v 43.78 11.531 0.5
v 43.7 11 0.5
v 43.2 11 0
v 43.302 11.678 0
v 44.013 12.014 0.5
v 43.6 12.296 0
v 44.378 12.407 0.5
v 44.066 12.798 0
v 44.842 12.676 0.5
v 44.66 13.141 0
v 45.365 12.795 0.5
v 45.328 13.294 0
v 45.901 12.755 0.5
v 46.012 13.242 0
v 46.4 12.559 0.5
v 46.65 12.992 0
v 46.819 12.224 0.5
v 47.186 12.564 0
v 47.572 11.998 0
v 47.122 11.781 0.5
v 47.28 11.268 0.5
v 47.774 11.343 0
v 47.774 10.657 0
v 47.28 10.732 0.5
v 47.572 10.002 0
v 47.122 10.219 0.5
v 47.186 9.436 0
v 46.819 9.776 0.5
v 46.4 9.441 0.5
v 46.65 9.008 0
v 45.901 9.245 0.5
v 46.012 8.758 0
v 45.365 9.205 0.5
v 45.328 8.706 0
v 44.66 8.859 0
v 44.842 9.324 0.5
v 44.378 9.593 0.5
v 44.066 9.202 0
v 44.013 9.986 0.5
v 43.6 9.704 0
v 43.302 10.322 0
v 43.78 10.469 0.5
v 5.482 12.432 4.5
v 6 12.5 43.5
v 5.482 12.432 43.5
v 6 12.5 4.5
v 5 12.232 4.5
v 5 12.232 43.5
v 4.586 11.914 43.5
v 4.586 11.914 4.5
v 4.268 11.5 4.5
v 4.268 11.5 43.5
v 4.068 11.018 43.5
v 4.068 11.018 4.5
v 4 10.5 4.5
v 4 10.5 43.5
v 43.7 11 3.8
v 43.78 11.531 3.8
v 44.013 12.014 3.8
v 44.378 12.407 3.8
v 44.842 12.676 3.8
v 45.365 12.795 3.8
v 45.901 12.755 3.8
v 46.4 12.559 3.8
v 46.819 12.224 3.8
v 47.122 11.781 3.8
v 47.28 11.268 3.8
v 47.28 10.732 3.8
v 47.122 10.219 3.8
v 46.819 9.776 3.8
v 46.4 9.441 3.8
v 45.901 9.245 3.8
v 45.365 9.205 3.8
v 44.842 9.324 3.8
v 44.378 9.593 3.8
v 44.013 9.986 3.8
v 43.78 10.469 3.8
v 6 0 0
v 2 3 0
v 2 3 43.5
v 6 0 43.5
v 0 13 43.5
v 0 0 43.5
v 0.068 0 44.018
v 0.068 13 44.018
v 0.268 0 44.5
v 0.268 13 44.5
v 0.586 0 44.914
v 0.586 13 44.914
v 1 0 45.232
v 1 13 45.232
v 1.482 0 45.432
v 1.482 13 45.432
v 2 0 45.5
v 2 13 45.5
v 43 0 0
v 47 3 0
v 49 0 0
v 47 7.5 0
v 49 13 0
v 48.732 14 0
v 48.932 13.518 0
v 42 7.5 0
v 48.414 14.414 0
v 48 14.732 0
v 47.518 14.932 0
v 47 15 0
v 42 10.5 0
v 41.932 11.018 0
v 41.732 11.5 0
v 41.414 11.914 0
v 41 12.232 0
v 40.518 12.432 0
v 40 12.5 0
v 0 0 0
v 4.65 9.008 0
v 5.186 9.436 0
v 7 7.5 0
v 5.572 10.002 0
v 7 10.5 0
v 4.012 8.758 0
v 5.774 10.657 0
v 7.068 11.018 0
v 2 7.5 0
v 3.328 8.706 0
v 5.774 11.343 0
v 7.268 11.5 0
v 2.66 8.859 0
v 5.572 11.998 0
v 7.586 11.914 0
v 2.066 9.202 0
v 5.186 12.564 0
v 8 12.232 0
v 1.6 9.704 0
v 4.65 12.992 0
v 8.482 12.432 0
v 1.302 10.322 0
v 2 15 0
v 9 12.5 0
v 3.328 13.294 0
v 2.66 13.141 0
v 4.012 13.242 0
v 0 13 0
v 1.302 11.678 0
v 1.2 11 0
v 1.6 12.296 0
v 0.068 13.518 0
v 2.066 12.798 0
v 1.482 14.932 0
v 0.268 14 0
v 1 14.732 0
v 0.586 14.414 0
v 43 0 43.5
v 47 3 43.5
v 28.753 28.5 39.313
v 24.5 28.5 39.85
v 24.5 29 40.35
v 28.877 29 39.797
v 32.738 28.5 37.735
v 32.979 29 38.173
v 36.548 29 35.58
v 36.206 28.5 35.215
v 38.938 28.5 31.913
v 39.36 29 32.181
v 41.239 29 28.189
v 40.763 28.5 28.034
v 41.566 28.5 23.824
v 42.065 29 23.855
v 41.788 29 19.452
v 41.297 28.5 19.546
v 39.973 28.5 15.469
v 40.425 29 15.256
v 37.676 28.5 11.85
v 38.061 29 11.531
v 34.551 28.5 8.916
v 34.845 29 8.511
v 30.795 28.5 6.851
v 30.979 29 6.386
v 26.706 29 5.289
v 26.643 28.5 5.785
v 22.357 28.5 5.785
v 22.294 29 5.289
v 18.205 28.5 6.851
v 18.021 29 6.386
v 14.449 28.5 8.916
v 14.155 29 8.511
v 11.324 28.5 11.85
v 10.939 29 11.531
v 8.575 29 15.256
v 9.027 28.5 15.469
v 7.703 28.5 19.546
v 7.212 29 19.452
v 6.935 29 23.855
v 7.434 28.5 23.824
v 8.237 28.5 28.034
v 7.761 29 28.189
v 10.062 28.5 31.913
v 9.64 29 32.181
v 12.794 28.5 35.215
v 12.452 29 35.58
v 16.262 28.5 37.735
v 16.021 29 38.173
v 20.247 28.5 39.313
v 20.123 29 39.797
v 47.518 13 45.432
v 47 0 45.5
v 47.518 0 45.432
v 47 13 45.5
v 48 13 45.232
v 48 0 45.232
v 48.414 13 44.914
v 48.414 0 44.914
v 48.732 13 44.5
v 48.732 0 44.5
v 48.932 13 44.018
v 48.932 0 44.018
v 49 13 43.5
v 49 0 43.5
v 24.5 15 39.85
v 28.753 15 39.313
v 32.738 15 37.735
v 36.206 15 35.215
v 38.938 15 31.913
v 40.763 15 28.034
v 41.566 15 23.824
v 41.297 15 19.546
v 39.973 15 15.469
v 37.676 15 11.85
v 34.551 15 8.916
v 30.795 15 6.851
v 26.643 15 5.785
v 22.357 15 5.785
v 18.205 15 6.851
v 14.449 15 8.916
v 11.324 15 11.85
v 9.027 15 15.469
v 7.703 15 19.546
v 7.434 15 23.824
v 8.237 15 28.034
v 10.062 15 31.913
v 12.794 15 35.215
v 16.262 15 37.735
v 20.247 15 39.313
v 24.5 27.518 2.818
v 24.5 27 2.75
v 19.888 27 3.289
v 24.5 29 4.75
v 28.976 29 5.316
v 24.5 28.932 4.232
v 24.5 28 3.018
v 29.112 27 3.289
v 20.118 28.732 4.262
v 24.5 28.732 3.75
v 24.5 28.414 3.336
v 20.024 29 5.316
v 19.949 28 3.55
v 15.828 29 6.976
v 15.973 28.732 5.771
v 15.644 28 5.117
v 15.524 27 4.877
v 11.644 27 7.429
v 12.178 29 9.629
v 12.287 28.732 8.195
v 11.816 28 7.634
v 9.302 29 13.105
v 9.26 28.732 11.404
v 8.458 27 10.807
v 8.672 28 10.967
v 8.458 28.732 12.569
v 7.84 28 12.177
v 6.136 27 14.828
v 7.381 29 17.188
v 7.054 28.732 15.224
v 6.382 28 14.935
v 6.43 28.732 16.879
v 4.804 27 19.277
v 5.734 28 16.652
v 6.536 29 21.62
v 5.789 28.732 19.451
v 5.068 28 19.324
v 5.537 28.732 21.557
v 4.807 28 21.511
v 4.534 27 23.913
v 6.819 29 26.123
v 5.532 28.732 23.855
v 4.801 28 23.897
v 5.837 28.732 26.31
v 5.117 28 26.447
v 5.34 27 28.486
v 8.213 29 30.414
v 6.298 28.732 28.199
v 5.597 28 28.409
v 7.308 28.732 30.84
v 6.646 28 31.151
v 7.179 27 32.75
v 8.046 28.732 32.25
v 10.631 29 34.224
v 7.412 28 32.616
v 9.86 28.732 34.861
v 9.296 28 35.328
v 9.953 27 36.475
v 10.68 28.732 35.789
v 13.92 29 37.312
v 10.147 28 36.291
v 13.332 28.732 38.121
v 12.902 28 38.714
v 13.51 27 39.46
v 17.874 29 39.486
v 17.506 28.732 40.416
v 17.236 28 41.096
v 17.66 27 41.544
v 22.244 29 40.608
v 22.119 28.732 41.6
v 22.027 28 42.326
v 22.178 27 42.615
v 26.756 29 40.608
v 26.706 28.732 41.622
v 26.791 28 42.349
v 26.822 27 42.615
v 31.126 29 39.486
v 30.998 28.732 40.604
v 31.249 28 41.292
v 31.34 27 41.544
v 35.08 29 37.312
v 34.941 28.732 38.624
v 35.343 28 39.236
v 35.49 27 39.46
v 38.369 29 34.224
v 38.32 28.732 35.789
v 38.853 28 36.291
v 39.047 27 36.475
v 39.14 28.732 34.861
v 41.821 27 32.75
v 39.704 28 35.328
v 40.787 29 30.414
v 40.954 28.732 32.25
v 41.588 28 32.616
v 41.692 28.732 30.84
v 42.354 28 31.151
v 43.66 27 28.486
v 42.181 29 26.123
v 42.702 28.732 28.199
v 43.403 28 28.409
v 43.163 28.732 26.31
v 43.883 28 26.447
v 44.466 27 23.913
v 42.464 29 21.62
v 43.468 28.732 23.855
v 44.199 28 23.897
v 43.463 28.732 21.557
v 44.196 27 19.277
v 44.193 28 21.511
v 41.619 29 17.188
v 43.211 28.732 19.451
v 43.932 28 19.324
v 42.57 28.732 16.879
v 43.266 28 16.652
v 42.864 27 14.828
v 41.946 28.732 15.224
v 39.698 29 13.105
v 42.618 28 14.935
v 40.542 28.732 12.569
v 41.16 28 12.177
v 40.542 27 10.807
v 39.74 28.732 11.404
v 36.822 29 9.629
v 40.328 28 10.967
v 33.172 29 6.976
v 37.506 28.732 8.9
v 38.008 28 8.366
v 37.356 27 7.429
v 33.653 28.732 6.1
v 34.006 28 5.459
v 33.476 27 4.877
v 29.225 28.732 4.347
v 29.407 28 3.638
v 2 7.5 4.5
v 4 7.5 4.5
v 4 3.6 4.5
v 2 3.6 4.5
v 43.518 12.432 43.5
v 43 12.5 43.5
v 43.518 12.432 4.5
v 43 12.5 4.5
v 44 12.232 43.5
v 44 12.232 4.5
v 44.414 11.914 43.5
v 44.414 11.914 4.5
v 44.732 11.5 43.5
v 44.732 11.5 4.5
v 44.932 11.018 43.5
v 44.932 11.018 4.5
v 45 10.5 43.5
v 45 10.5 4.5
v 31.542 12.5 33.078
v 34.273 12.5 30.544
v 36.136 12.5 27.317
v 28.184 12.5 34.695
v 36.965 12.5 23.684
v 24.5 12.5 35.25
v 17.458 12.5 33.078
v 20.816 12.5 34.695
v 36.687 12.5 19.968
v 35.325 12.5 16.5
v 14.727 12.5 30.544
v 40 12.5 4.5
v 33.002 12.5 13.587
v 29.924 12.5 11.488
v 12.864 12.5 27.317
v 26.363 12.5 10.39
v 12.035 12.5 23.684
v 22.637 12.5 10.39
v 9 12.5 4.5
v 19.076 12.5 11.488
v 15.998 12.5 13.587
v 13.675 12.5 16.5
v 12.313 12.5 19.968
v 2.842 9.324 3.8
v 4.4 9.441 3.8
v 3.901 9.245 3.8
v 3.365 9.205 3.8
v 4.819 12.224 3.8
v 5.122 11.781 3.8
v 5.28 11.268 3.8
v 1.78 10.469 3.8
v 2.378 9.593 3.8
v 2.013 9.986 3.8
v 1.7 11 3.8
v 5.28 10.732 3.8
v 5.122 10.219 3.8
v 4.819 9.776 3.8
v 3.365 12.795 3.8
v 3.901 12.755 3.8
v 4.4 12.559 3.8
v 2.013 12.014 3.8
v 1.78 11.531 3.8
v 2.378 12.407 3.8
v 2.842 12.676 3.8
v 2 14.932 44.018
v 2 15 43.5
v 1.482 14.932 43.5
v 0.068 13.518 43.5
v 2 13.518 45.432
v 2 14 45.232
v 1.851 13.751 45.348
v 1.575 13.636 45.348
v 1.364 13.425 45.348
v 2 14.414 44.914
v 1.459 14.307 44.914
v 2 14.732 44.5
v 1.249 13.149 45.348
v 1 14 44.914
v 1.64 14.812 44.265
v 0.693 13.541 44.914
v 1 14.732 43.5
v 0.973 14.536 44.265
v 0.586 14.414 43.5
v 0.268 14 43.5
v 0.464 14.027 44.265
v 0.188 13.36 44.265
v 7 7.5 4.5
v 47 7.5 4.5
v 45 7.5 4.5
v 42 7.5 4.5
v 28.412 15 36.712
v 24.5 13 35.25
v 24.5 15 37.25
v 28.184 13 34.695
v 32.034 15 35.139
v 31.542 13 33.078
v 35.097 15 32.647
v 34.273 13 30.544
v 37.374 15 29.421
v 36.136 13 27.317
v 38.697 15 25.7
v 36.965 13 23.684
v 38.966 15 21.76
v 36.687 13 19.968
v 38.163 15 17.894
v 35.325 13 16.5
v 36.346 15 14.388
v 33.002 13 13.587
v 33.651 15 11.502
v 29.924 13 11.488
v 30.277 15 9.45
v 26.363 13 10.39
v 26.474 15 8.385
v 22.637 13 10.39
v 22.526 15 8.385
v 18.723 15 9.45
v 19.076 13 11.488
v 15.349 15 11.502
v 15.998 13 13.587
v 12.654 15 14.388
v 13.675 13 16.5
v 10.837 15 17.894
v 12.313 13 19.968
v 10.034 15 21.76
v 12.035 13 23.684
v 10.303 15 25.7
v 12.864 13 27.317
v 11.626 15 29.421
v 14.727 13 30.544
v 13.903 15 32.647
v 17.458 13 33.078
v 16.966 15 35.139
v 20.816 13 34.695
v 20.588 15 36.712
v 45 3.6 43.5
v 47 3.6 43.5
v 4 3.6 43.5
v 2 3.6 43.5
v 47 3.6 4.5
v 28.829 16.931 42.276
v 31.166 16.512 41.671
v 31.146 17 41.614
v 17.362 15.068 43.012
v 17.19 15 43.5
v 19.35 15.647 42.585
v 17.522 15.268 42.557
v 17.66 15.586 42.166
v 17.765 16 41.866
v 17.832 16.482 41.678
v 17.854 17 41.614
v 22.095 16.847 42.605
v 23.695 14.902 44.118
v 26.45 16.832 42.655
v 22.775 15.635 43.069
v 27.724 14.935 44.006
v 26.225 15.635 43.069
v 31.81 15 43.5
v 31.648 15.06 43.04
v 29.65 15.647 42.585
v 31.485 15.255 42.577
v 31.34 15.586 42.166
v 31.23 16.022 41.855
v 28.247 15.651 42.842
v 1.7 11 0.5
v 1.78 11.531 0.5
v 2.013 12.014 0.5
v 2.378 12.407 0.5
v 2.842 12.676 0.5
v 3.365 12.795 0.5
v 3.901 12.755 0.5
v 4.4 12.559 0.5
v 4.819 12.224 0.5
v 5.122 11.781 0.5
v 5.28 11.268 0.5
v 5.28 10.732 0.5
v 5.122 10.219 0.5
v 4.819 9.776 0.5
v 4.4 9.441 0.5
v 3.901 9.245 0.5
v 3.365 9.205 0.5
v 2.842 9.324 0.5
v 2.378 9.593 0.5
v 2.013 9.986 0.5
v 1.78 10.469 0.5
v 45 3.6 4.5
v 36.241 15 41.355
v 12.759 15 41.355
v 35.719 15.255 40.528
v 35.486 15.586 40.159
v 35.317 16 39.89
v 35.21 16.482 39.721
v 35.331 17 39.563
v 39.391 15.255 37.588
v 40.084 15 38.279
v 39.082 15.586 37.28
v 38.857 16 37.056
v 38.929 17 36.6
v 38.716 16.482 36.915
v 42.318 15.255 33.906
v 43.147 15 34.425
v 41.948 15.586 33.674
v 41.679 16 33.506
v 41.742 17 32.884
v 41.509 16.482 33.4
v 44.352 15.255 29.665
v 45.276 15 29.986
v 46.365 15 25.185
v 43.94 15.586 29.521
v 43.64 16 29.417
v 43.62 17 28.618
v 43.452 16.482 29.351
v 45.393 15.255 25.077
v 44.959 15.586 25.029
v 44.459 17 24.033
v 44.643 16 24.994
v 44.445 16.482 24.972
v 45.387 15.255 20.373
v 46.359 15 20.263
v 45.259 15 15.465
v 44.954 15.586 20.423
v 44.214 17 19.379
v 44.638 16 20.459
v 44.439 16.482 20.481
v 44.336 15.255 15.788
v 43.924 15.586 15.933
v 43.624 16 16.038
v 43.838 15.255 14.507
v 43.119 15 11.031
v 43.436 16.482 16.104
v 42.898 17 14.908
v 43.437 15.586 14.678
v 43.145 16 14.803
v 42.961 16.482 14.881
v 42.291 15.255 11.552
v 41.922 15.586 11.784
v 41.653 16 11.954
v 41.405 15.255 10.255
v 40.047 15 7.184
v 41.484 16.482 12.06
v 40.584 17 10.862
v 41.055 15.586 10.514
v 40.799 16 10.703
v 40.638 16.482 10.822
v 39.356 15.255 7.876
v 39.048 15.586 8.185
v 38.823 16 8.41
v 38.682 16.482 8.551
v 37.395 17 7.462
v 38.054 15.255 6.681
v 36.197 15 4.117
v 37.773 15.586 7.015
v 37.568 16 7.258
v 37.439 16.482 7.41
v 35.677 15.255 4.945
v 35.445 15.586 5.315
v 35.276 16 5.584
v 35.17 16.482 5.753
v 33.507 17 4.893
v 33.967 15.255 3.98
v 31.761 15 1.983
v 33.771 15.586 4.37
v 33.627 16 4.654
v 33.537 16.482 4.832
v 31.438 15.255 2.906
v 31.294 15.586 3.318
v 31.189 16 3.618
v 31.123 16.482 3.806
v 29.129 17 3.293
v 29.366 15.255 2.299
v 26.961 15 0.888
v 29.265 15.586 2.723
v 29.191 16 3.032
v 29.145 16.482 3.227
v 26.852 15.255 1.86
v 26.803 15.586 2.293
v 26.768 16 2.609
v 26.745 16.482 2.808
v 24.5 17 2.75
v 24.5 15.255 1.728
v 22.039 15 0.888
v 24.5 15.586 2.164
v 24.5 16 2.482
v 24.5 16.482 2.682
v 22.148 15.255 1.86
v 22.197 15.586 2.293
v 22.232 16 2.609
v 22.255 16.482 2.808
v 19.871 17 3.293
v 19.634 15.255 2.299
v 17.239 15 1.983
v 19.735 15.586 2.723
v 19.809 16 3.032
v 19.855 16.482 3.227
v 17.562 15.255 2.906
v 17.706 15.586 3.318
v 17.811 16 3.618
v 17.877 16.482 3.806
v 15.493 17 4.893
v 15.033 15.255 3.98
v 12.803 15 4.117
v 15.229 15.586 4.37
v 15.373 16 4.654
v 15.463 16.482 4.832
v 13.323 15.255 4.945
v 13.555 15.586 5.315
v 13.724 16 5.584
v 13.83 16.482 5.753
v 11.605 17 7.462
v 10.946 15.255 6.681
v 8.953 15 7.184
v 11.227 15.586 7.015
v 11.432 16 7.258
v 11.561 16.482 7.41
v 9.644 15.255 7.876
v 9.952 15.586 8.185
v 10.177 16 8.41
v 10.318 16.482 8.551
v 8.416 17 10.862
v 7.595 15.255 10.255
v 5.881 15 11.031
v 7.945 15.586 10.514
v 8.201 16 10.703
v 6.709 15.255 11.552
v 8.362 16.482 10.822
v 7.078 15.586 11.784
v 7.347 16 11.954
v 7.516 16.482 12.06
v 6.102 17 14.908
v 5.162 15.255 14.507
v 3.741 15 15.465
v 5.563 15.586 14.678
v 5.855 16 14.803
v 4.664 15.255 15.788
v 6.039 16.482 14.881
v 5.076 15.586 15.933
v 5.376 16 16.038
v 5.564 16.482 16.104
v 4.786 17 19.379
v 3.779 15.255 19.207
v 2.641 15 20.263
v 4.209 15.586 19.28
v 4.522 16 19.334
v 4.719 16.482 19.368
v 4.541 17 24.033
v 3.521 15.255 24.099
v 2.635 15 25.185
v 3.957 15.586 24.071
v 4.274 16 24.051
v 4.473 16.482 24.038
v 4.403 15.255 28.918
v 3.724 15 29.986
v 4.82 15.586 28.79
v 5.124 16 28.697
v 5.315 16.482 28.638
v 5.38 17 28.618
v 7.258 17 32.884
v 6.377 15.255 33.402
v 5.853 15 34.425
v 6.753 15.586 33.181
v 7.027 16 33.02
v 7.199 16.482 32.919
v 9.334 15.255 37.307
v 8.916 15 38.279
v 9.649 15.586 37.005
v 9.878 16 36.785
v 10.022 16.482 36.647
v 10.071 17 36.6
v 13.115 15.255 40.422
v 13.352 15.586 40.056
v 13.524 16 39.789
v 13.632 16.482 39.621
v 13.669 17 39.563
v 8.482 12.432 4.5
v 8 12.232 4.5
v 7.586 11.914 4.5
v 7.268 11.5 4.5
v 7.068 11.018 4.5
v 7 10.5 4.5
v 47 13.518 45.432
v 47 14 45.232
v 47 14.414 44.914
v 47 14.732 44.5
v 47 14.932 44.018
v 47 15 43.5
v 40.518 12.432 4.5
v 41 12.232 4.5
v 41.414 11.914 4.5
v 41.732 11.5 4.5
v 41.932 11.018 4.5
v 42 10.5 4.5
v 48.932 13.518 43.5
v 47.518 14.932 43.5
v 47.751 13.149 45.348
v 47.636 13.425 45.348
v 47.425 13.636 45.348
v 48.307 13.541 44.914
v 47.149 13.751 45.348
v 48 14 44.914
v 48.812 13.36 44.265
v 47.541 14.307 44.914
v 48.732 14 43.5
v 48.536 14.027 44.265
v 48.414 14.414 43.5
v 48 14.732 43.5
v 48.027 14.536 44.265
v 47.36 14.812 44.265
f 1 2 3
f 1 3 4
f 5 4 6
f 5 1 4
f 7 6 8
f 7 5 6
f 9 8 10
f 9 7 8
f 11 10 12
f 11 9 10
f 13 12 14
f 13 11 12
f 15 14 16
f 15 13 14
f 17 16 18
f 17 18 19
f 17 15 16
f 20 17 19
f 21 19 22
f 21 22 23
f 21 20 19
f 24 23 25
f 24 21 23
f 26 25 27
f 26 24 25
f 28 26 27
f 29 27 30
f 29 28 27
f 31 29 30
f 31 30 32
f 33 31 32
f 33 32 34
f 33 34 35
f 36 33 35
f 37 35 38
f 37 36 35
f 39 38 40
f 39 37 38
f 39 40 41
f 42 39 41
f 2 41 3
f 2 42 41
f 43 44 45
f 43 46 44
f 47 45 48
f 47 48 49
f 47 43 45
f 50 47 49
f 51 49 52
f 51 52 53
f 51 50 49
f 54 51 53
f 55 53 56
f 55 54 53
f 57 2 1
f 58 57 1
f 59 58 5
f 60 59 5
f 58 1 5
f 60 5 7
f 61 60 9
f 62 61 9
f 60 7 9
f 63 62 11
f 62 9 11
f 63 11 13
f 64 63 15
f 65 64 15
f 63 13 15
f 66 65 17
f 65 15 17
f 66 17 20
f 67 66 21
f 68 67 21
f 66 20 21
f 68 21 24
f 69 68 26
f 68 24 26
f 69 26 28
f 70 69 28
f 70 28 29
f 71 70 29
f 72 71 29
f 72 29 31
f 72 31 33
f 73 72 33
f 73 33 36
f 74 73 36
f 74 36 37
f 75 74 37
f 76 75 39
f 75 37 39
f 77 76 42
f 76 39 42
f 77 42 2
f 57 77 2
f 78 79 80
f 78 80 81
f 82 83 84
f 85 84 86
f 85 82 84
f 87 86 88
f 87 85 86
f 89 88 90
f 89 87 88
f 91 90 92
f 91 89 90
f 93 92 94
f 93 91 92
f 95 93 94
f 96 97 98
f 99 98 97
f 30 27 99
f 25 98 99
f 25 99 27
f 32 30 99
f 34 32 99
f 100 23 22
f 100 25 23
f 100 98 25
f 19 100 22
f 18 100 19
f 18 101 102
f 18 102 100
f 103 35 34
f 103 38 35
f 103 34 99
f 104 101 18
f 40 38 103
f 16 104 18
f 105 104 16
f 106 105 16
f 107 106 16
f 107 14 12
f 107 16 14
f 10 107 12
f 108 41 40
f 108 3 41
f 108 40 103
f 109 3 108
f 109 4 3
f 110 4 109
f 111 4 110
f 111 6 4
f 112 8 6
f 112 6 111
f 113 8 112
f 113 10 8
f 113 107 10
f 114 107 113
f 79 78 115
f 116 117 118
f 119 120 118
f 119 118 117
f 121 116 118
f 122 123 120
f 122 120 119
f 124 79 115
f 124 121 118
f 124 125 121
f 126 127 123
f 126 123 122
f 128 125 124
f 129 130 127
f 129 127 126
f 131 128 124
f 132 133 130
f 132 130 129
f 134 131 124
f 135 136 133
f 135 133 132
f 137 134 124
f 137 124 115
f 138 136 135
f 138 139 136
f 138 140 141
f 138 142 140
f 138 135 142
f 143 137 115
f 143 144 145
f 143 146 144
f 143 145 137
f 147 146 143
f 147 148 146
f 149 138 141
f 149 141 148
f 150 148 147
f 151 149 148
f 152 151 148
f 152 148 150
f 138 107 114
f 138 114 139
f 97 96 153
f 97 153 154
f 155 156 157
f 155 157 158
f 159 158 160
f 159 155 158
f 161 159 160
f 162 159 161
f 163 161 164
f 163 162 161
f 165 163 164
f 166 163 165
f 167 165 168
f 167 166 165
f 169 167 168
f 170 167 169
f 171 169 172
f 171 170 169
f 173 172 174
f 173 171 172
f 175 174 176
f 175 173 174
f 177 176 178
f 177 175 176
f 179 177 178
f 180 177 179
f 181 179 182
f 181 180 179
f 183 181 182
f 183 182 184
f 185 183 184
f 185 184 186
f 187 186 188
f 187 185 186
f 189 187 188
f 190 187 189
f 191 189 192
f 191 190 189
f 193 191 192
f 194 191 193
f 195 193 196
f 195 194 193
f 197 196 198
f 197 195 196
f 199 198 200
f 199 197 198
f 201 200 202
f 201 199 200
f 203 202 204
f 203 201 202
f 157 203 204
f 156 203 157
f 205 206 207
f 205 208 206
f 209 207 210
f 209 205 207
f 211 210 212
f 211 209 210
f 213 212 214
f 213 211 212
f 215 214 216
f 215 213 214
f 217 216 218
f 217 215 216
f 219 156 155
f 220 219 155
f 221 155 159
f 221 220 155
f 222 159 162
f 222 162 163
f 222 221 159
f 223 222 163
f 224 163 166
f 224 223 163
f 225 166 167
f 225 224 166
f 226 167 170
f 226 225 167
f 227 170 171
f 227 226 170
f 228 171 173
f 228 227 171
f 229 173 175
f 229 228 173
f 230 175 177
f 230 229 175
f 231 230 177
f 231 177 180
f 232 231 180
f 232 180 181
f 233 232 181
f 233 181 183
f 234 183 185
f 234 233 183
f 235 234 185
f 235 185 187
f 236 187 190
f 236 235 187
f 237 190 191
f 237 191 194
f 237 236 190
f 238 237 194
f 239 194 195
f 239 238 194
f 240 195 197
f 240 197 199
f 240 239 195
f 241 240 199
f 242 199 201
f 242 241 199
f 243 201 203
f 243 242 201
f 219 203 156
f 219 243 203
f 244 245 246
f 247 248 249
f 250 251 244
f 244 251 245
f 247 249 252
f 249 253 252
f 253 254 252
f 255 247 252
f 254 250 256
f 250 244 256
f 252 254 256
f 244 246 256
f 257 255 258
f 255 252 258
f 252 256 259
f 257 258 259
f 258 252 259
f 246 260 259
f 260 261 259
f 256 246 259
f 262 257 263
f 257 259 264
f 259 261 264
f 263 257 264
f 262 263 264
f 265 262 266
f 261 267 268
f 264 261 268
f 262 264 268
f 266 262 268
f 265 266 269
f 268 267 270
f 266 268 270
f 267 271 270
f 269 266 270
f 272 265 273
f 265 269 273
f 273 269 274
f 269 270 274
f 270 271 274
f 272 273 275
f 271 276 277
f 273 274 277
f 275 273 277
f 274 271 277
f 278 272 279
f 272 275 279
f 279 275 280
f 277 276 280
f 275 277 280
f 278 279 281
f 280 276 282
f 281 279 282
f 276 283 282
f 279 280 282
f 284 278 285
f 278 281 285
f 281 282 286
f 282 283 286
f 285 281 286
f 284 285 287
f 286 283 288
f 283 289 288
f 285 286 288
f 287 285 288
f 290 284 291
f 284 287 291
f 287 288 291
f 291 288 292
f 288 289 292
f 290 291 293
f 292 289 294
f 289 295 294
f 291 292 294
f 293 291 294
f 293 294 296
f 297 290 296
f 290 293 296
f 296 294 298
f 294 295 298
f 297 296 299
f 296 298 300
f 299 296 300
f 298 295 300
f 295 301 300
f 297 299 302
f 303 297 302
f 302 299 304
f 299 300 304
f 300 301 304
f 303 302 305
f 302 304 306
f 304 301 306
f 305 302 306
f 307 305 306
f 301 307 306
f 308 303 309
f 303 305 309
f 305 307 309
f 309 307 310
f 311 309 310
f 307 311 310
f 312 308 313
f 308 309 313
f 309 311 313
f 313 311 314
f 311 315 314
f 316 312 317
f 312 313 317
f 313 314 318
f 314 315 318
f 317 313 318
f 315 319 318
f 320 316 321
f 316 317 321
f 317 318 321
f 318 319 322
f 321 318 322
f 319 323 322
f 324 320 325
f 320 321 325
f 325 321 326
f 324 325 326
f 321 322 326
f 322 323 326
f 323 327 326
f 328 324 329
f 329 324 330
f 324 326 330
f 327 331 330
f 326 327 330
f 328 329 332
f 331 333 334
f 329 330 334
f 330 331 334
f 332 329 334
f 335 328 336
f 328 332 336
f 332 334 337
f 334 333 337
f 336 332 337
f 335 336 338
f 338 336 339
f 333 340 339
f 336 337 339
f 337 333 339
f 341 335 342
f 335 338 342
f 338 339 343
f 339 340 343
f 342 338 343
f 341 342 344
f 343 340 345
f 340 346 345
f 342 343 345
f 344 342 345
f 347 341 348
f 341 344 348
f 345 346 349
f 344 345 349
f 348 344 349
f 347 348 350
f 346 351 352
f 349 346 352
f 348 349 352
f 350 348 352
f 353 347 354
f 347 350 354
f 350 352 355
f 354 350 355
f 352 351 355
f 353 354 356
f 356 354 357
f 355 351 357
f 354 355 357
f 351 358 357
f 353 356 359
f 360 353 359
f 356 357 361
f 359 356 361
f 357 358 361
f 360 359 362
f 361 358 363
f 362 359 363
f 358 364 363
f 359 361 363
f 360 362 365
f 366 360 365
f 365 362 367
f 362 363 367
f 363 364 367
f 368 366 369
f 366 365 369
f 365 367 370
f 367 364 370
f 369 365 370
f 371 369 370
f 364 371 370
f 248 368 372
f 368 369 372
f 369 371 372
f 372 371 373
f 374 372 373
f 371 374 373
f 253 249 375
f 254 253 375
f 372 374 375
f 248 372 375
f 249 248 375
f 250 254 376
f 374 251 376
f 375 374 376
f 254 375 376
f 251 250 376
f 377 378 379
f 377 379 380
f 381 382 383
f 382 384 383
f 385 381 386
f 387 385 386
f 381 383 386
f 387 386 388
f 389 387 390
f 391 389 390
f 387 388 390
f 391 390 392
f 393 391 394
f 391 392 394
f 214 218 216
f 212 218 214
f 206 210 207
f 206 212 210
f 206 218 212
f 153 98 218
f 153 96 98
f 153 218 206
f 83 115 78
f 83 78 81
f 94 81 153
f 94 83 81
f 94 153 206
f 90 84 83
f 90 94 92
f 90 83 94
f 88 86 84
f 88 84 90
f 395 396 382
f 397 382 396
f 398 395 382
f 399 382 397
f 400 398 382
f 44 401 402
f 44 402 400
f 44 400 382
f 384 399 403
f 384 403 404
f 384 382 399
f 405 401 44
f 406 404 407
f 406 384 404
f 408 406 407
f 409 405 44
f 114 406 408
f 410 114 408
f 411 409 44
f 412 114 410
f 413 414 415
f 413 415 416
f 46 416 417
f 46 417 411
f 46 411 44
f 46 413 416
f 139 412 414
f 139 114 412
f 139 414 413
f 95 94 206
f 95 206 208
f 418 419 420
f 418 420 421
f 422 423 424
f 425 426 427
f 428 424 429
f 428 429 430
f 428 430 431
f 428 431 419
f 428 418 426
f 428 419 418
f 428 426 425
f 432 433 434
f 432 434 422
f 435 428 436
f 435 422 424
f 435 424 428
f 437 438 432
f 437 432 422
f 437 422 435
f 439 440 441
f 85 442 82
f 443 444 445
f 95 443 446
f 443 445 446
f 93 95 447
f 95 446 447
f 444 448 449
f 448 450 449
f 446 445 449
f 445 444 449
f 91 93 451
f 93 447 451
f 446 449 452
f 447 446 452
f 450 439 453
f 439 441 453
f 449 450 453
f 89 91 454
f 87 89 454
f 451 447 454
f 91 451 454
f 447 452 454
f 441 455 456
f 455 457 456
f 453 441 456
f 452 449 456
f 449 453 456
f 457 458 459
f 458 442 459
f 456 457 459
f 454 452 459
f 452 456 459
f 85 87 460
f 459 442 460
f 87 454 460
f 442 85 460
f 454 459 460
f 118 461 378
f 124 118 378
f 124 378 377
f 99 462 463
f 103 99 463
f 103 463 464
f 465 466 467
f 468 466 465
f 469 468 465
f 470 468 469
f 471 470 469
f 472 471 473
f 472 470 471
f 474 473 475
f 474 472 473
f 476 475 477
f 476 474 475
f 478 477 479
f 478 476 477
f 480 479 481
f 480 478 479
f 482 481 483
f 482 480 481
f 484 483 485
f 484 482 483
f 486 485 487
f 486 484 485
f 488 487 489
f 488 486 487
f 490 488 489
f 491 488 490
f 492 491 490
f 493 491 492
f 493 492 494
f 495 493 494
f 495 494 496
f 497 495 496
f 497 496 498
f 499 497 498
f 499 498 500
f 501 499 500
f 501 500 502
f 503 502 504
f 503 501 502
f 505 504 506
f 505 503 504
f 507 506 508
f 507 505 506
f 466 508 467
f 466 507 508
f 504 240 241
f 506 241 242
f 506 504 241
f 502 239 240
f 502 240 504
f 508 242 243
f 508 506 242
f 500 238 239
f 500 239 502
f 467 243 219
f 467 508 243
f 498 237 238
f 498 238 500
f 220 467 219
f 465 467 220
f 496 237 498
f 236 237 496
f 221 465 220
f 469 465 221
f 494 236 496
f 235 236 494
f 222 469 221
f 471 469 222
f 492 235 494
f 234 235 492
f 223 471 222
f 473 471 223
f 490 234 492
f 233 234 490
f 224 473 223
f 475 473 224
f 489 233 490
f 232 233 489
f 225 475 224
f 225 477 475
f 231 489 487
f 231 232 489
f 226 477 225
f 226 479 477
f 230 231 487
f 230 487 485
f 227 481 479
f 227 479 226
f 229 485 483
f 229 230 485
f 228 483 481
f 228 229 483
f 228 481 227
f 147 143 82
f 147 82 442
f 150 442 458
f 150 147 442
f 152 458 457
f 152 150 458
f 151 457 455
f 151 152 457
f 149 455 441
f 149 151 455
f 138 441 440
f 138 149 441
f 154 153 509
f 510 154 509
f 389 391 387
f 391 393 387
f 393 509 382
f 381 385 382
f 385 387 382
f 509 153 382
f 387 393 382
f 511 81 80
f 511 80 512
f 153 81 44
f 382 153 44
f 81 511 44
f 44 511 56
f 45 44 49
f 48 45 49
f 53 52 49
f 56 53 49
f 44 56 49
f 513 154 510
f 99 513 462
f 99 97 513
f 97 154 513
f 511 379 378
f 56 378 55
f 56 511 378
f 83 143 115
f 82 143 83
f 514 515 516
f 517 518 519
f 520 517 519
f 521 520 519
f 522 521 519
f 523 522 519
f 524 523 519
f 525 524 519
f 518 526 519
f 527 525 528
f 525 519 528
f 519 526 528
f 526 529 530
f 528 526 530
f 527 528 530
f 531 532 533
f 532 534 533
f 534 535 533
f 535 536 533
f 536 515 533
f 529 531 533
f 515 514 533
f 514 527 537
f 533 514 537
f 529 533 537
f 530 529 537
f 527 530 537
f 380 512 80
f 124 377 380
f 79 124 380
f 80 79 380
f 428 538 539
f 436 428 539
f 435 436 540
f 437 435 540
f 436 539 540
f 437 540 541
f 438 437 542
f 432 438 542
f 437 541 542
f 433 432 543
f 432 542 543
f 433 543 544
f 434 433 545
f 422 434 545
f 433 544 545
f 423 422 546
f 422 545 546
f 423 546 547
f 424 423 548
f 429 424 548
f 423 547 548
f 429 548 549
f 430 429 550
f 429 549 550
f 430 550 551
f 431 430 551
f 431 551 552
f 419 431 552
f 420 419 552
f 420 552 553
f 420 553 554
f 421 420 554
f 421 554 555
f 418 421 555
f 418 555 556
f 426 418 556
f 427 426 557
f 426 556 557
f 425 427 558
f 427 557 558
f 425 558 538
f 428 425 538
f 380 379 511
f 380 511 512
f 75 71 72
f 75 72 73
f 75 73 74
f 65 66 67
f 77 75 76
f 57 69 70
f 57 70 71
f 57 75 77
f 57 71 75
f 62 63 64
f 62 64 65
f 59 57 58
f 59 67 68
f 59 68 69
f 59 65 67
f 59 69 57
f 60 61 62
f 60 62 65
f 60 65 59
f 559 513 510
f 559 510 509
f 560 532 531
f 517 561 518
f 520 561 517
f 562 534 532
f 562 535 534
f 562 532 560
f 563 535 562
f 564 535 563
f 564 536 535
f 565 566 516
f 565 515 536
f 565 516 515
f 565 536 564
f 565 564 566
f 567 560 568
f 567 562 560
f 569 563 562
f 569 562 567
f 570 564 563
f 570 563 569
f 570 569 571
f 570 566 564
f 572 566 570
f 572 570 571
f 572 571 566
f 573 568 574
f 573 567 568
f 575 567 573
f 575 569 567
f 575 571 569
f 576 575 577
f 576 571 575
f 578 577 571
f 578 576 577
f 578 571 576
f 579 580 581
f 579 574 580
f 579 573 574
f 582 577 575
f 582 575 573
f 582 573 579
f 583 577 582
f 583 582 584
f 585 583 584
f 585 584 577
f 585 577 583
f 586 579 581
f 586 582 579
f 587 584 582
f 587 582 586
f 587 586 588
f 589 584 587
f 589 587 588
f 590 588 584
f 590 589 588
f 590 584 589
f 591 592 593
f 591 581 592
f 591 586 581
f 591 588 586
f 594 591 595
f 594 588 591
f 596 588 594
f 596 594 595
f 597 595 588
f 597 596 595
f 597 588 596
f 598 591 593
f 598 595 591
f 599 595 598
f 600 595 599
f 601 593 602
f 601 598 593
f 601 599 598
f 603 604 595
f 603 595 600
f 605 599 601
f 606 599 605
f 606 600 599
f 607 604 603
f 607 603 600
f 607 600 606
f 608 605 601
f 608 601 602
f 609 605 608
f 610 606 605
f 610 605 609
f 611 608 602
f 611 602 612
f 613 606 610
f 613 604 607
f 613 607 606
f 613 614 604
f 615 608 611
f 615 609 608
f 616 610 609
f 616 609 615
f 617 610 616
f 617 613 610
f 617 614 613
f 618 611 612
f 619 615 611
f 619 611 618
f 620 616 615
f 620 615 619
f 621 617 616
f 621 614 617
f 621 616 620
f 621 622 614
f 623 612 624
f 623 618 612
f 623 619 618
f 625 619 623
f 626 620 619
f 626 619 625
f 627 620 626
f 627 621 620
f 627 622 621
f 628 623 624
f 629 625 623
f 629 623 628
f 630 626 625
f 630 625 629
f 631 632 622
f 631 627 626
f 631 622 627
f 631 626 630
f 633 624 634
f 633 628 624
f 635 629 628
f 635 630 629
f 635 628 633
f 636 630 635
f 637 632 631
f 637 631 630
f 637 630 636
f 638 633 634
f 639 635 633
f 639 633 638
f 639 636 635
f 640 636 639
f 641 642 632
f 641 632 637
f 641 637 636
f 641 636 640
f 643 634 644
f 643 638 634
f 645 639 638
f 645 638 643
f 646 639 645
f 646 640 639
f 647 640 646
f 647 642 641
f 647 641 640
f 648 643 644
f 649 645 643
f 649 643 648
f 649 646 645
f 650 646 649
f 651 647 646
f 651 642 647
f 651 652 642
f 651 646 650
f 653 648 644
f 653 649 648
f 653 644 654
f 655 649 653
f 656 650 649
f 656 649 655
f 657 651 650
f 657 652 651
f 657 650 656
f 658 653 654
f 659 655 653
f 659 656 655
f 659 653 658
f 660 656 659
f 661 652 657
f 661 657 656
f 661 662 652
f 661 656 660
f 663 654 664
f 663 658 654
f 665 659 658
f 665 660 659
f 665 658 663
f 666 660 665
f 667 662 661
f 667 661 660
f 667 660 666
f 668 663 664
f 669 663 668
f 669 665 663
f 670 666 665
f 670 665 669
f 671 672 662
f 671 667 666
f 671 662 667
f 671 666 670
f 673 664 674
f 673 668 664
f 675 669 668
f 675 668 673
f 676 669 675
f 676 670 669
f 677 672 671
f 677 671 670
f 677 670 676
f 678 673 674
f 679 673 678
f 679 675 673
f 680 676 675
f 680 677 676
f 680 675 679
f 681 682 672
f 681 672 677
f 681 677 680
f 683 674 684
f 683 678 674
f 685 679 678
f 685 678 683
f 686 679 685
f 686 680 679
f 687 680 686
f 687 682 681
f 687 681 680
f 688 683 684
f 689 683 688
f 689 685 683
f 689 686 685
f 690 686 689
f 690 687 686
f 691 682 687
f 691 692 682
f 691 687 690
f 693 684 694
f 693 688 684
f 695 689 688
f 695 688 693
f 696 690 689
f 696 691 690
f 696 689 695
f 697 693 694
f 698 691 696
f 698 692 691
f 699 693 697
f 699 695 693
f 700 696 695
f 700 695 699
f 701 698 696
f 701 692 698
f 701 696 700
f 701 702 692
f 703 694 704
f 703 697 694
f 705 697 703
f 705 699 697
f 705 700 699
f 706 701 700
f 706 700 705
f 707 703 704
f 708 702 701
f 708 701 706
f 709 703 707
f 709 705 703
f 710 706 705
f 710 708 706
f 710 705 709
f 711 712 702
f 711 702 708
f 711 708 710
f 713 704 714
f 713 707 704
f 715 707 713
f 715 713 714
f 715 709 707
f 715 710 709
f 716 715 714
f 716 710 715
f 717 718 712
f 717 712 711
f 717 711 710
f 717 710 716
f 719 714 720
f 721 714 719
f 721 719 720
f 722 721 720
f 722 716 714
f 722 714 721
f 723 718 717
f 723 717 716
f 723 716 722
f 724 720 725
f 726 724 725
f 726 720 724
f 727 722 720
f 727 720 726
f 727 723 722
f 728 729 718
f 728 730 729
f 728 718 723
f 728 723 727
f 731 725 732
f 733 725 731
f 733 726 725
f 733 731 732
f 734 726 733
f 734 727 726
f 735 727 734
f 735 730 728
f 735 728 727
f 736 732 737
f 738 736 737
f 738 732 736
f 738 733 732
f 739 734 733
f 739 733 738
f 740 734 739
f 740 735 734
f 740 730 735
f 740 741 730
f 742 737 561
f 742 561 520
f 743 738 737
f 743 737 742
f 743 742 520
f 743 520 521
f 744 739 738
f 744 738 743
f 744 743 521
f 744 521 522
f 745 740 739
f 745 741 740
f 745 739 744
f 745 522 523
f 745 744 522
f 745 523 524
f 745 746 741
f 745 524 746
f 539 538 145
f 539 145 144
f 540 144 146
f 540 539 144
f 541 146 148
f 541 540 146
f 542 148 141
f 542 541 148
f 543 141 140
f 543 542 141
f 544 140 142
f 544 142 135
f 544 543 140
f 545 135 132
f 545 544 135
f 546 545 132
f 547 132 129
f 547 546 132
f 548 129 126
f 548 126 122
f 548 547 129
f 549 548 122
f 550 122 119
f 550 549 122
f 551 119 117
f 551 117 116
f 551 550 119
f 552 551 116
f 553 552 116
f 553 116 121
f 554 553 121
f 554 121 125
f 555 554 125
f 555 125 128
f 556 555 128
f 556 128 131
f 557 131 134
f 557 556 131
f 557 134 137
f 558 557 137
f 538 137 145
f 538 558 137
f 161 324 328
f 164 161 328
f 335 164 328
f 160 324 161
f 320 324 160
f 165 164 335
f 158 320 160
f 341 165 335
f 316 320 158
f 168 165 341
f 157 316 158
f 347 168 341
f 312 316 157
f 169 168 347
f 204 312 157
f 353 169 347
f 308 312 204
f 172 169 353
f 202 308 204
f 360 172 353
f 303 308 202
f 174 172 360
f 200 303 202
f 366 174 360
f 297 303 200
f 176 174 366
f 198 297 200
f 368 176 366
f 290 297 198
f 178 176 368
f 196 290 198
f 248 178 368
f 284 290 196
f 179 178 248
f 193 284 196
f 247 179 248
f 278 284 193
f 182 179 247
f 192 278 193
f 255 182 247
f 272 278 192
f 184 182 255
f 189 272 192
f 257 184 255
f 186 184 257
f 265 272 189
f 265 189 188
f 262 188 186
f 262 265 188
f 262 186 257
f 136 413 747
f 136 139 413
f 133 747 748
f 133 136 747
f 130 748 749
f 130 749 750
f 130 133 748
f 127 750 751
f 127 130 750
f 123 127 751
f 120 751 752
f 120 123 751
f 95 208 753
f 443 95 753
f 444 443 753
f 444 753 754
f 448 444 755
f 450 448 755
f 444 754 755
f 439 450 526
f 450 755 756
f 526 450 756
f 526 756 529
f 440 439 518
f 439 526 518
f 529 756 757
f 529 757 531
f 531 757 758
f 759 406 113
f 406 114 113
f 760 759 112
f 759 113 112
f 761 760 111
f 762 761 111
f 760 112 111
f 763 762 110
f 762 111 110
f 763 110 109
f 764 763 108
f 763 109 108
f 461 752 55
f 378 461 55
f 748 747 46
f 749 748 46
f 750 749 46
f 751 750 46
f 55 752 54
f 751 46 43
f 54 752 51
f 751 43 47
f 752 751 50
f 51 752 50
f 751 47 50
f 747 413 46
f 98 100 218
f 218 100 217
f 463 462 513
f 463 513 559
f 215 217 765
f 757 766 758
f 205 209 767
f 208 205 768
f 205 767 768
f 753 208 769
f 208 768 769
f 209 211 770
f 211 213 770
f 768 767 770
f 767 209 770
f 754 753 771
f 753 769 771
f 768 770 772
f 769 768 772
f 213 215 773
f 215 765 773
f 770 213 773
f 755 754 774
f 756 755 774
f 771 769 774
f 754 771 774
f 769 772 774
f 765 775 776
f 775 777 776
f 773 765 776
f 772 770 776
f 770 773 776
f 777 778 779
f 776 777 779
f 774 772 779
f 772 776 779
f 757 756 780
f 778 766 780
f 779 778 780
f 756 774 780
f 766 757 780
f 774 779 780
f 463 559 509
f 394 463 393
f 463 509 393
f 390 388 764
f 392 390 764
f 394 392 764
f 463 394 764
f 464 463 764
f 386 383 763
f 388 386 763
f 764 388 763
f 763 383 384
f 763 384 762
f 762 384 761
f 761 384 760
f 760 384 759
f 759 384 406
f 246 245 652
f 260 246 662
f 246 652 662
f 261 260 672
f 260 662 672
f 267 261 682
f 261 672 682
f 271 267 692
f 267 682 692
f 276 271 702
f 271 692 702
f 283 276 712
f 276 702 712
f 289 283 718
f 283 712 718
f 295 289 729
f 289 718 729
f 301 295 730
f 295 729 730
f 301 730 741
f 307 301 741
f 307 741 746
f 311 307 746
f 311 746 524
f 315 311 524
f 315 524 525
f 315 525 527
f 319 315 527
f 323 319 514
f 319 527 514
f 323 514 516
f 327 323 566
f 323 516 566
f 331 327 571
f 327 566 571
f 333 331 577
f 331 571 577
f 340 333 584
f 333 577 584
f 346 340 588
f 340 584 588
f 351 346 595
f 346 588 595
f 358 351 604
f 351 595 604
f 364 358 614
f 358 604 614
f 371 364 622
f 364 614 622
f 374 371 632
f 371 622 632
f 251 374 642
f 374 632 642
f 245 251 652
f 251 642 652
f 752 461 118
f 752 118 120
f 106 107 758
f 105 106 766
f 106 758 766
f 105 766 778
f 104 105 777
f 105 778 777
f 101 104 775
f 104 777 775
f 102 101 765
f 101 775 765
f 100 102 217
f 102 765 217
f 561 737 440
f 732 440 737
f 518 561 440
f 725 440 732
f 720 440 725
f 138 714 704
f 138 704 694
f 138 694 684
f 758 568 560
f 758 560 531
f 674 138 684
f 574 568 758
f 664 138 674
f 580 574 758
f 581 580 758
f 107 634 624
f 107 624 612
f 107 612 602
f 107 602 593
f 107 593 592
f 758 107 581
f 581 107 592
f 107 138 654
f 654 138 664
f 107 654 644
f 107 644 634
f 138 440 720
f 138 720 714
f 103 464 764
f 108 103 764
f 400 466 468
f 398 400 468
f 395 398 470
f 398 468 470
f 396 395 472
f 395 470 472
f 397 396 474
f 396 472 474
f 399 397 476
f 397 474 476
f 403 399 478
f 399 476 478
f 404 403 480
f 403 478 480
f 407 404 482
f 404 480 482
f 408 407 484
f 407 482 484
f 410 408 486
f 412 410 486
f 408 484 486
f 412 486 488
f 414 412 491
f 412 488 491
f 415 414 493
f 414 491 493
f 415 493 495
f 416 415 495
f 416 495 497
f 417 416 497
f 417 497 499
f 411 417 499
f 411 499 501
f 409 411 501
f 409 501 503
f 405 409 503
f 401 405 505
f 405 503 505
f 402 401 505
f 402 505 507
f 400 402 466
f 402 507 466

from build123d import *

# Parameters (mm, degrees)
BOSS_EXTRU_1_DEPTH      = 43.5
ESQUISSE2_W             = 2
ESQUISSE2_H             = 15
BOSS_EXTRU_2_DEPTH      = 49
ESQUISSE4_W             = 2
ESQUISSE4_H             = 8.9
BOSS_EXTRU_3_DEPTH      = 39
ESQUISSE5_W             = 5
ESQUISSE5_H             = 5
BOSS_EXTRU_4_DEPTH      = 4.5
CONG_1_R                = 2
CONG_2_R                = 2
CONG_5_R                = 2
ESQUISSE6_R             = 12.5
ENL_V_MAT_EXTRU_1_DEPTH = 2.5
CHANFREIN1_SIZE         = 2
ESQUISSE7_R             = 1.8
ENL_V_MAT_EXTRU_2_DEPTH = 3.8
CHANFREIN3_SIZE         = 0.5
ESQUISSE8_R             = 20
ESQUISSE8_R_2           = 17.1
BOSS_EXTRU_5_DEPTH      = 14
CONG_6_R                = 2
CONG_7_R                = 2
CHANFREIN4_SIZE         = 0.5


with BuildPart() as part:
    # Esquisse1 → Boss.-Extru.1 (new body)
    with BuildSketch(Plane.XY):
        Polygon((6, 0), (0, 0), (0, 15), (49, 15), (49, 0), (43, 0), (47, 3), (47, 12.5), (2, 12.5), (2, 3), align=None)
    extrude(amount=BOSS_EXTRU_1_DEPTH)

    # Esquisse2 → Boss.-Extru.2 (add)
    with BuildSketch(Plane.ZY):
        with Locations((44.5, 7.5)):
            Rectangle(ESQUISSE2_W, ESQUISSE2_H)
    extrude(amount=-BOSS_EXTRU_2_DEPTH)

    # Esquisse4 → Boss.-Extru.3 (add)
    with BuildSketch(Plane(origin=(0, 0, 43.5), x_dir=(-1, 0, 0), z_dir=(0, 0, -1))):
        with Locations((-46, 8.05)):
            Rectangle(ESQUISSE4_W, ESQUISSE4_H)
        with Locations((-3, 8.05)):
            Rectangle(ESQUISSE4_W, ESQUISSE4_H)
    extrude(amount=BOSS_EXTRU_3_DEPTH)

    # Esquisse5 → Boss.-Extru.4 (add)
    with BuildSketch(Plane(origin=(0, 0, 4.5), x_dir=(-1, 0, 0), z_dir=(0, 0, -1))):
        with Locations((-44.5, 10)):
            Rectangle(ESQUISSE5_W, ESQUISSE5_H)
        with Locations((-4.5, 10)):
            Rectangle(ESQUISSE5_W, ESQUISSE5_H)
    extrude(amount=BOSS_EXTRU_4_DEPTH)

    # Congé1
    cong_1_edges = [part.edges().sort_by_distance(p)[0] for p in [
        (45, 12.5, 24),
        (4, 12.5, 24),
    ]]
    fillet(cong_1_edges, radius=CONG_1_R)

    # Congé2
    cong_2_edges = [part.edges().sort_by_distance(p)[0] for p in [
        (42, 12.5, 2.25),
        (7, 12.5, 2.25),
    ]]
    fillet(cong_2_edges, radius=CONG_2_R)

    # Congé5
    cong_5_edges = [part.edges().sort_by_distance(p)[0] for p in [
        (0, 15, 22.75),
        (49, 15, 22.75),
        (49, 7.5, 45.5),
        (24.5, 15, 45.5),
        (0, 7.5, 45.5),
    ]]
    fillet(cong_5_edges, radius=CONG_5_R)

    # Esquisse6 → Enlèv. mat.-Extru.1 (cut)
    with BuildSketch(Plane(origin=(0, 15, 0), x_dir=(1, 0, 0), z_dir=(0, 1, 0))):
        with Locations(Location((24.5, -22.75, 0), (0, 0, 270))):
            Circle(ESQUISSE6_R)
    extrude(amount=-ENL_V_MAT_EXTRU_1_DEPTH, mode=Mode.SUBTRACT)

    # Chanfrein1
    chanfrein1_edges = [part.edges().sort_by_distance(p)[0] for p in [
        (24.5, 15, 10.25),
    ]]
    chamfer(chanfrein1_edges, length=CHANFREIN1_SIZE)

    # Esquisse7 → Enlèv. mat.-Extru.2 (cut)
    with BuildSketch(Plane(origin=(0, 0, 0), x_dir=(-1, 0, 0), z_dir=(0, 0, -1))):
        with Locations((-45.5, 11)):
            Circle(ESQUISSE7_R)
        with Locations((-3.5, 11)):
            Circle(ESQUISSE7_R)
    extrude(amount=-ENL_V_MAT_EXTRU_2_DEPTH, mode=Mode.SUBTRACT)

    # Chanfrein3
    chanfrein3_edges = [part.edges().sort_by_distance(p)[0] for p in [
        (47.3, 11, 0),
        (5.3, 11, 0),
    ]]
    chamfer(chanfrein3_edges, length=CHANFREIN3_SIZE)

    # Esquisse8 → Boss.-Extru.5 (add)
    with BuildSketch(Plane(origin=(0, 15, 0), x_dir=(1, 0, 0), z_dir=(0, 1, 0))):
        with Locations(Location((24.5, -22.75, 0), (0, 0, 90))):
            Circle(ESQUISSE8_R)
        with Locations(Location((24.5, -22.75, 0), (0, 0, 270))):
            Circle(ESQUISSE8_R_2, mode=Mode.SUBTRACT)
    extrude(amount=BOSS_EXTRU_5_DEPTH)

    # Congé6
    cong_6_edges = [part.edges().sort_by_distance(p)[0] for p in [
        (24.5, 15, 42.75),
    ]]
    fillet(cong_6_edges, radius=CONG_6_R)

    # Congé7
    cong_7_edges = [part.edges().sort_by_distance(p)[0] for p in [
        (24.5, 29, 42.75),
    ]]
    fillet(cong_7_edges, radius=CONG_7_R)

    # Chanfrein4
    chanfrein4_edges = [part.edges().sort_by_distance(p)[0] for p in [
        (24.5, 29, 5.65),
    ]]
    chamfer(chanfrein4_edges, length=CHANFREIN4_SIZE)


solid = part.part
